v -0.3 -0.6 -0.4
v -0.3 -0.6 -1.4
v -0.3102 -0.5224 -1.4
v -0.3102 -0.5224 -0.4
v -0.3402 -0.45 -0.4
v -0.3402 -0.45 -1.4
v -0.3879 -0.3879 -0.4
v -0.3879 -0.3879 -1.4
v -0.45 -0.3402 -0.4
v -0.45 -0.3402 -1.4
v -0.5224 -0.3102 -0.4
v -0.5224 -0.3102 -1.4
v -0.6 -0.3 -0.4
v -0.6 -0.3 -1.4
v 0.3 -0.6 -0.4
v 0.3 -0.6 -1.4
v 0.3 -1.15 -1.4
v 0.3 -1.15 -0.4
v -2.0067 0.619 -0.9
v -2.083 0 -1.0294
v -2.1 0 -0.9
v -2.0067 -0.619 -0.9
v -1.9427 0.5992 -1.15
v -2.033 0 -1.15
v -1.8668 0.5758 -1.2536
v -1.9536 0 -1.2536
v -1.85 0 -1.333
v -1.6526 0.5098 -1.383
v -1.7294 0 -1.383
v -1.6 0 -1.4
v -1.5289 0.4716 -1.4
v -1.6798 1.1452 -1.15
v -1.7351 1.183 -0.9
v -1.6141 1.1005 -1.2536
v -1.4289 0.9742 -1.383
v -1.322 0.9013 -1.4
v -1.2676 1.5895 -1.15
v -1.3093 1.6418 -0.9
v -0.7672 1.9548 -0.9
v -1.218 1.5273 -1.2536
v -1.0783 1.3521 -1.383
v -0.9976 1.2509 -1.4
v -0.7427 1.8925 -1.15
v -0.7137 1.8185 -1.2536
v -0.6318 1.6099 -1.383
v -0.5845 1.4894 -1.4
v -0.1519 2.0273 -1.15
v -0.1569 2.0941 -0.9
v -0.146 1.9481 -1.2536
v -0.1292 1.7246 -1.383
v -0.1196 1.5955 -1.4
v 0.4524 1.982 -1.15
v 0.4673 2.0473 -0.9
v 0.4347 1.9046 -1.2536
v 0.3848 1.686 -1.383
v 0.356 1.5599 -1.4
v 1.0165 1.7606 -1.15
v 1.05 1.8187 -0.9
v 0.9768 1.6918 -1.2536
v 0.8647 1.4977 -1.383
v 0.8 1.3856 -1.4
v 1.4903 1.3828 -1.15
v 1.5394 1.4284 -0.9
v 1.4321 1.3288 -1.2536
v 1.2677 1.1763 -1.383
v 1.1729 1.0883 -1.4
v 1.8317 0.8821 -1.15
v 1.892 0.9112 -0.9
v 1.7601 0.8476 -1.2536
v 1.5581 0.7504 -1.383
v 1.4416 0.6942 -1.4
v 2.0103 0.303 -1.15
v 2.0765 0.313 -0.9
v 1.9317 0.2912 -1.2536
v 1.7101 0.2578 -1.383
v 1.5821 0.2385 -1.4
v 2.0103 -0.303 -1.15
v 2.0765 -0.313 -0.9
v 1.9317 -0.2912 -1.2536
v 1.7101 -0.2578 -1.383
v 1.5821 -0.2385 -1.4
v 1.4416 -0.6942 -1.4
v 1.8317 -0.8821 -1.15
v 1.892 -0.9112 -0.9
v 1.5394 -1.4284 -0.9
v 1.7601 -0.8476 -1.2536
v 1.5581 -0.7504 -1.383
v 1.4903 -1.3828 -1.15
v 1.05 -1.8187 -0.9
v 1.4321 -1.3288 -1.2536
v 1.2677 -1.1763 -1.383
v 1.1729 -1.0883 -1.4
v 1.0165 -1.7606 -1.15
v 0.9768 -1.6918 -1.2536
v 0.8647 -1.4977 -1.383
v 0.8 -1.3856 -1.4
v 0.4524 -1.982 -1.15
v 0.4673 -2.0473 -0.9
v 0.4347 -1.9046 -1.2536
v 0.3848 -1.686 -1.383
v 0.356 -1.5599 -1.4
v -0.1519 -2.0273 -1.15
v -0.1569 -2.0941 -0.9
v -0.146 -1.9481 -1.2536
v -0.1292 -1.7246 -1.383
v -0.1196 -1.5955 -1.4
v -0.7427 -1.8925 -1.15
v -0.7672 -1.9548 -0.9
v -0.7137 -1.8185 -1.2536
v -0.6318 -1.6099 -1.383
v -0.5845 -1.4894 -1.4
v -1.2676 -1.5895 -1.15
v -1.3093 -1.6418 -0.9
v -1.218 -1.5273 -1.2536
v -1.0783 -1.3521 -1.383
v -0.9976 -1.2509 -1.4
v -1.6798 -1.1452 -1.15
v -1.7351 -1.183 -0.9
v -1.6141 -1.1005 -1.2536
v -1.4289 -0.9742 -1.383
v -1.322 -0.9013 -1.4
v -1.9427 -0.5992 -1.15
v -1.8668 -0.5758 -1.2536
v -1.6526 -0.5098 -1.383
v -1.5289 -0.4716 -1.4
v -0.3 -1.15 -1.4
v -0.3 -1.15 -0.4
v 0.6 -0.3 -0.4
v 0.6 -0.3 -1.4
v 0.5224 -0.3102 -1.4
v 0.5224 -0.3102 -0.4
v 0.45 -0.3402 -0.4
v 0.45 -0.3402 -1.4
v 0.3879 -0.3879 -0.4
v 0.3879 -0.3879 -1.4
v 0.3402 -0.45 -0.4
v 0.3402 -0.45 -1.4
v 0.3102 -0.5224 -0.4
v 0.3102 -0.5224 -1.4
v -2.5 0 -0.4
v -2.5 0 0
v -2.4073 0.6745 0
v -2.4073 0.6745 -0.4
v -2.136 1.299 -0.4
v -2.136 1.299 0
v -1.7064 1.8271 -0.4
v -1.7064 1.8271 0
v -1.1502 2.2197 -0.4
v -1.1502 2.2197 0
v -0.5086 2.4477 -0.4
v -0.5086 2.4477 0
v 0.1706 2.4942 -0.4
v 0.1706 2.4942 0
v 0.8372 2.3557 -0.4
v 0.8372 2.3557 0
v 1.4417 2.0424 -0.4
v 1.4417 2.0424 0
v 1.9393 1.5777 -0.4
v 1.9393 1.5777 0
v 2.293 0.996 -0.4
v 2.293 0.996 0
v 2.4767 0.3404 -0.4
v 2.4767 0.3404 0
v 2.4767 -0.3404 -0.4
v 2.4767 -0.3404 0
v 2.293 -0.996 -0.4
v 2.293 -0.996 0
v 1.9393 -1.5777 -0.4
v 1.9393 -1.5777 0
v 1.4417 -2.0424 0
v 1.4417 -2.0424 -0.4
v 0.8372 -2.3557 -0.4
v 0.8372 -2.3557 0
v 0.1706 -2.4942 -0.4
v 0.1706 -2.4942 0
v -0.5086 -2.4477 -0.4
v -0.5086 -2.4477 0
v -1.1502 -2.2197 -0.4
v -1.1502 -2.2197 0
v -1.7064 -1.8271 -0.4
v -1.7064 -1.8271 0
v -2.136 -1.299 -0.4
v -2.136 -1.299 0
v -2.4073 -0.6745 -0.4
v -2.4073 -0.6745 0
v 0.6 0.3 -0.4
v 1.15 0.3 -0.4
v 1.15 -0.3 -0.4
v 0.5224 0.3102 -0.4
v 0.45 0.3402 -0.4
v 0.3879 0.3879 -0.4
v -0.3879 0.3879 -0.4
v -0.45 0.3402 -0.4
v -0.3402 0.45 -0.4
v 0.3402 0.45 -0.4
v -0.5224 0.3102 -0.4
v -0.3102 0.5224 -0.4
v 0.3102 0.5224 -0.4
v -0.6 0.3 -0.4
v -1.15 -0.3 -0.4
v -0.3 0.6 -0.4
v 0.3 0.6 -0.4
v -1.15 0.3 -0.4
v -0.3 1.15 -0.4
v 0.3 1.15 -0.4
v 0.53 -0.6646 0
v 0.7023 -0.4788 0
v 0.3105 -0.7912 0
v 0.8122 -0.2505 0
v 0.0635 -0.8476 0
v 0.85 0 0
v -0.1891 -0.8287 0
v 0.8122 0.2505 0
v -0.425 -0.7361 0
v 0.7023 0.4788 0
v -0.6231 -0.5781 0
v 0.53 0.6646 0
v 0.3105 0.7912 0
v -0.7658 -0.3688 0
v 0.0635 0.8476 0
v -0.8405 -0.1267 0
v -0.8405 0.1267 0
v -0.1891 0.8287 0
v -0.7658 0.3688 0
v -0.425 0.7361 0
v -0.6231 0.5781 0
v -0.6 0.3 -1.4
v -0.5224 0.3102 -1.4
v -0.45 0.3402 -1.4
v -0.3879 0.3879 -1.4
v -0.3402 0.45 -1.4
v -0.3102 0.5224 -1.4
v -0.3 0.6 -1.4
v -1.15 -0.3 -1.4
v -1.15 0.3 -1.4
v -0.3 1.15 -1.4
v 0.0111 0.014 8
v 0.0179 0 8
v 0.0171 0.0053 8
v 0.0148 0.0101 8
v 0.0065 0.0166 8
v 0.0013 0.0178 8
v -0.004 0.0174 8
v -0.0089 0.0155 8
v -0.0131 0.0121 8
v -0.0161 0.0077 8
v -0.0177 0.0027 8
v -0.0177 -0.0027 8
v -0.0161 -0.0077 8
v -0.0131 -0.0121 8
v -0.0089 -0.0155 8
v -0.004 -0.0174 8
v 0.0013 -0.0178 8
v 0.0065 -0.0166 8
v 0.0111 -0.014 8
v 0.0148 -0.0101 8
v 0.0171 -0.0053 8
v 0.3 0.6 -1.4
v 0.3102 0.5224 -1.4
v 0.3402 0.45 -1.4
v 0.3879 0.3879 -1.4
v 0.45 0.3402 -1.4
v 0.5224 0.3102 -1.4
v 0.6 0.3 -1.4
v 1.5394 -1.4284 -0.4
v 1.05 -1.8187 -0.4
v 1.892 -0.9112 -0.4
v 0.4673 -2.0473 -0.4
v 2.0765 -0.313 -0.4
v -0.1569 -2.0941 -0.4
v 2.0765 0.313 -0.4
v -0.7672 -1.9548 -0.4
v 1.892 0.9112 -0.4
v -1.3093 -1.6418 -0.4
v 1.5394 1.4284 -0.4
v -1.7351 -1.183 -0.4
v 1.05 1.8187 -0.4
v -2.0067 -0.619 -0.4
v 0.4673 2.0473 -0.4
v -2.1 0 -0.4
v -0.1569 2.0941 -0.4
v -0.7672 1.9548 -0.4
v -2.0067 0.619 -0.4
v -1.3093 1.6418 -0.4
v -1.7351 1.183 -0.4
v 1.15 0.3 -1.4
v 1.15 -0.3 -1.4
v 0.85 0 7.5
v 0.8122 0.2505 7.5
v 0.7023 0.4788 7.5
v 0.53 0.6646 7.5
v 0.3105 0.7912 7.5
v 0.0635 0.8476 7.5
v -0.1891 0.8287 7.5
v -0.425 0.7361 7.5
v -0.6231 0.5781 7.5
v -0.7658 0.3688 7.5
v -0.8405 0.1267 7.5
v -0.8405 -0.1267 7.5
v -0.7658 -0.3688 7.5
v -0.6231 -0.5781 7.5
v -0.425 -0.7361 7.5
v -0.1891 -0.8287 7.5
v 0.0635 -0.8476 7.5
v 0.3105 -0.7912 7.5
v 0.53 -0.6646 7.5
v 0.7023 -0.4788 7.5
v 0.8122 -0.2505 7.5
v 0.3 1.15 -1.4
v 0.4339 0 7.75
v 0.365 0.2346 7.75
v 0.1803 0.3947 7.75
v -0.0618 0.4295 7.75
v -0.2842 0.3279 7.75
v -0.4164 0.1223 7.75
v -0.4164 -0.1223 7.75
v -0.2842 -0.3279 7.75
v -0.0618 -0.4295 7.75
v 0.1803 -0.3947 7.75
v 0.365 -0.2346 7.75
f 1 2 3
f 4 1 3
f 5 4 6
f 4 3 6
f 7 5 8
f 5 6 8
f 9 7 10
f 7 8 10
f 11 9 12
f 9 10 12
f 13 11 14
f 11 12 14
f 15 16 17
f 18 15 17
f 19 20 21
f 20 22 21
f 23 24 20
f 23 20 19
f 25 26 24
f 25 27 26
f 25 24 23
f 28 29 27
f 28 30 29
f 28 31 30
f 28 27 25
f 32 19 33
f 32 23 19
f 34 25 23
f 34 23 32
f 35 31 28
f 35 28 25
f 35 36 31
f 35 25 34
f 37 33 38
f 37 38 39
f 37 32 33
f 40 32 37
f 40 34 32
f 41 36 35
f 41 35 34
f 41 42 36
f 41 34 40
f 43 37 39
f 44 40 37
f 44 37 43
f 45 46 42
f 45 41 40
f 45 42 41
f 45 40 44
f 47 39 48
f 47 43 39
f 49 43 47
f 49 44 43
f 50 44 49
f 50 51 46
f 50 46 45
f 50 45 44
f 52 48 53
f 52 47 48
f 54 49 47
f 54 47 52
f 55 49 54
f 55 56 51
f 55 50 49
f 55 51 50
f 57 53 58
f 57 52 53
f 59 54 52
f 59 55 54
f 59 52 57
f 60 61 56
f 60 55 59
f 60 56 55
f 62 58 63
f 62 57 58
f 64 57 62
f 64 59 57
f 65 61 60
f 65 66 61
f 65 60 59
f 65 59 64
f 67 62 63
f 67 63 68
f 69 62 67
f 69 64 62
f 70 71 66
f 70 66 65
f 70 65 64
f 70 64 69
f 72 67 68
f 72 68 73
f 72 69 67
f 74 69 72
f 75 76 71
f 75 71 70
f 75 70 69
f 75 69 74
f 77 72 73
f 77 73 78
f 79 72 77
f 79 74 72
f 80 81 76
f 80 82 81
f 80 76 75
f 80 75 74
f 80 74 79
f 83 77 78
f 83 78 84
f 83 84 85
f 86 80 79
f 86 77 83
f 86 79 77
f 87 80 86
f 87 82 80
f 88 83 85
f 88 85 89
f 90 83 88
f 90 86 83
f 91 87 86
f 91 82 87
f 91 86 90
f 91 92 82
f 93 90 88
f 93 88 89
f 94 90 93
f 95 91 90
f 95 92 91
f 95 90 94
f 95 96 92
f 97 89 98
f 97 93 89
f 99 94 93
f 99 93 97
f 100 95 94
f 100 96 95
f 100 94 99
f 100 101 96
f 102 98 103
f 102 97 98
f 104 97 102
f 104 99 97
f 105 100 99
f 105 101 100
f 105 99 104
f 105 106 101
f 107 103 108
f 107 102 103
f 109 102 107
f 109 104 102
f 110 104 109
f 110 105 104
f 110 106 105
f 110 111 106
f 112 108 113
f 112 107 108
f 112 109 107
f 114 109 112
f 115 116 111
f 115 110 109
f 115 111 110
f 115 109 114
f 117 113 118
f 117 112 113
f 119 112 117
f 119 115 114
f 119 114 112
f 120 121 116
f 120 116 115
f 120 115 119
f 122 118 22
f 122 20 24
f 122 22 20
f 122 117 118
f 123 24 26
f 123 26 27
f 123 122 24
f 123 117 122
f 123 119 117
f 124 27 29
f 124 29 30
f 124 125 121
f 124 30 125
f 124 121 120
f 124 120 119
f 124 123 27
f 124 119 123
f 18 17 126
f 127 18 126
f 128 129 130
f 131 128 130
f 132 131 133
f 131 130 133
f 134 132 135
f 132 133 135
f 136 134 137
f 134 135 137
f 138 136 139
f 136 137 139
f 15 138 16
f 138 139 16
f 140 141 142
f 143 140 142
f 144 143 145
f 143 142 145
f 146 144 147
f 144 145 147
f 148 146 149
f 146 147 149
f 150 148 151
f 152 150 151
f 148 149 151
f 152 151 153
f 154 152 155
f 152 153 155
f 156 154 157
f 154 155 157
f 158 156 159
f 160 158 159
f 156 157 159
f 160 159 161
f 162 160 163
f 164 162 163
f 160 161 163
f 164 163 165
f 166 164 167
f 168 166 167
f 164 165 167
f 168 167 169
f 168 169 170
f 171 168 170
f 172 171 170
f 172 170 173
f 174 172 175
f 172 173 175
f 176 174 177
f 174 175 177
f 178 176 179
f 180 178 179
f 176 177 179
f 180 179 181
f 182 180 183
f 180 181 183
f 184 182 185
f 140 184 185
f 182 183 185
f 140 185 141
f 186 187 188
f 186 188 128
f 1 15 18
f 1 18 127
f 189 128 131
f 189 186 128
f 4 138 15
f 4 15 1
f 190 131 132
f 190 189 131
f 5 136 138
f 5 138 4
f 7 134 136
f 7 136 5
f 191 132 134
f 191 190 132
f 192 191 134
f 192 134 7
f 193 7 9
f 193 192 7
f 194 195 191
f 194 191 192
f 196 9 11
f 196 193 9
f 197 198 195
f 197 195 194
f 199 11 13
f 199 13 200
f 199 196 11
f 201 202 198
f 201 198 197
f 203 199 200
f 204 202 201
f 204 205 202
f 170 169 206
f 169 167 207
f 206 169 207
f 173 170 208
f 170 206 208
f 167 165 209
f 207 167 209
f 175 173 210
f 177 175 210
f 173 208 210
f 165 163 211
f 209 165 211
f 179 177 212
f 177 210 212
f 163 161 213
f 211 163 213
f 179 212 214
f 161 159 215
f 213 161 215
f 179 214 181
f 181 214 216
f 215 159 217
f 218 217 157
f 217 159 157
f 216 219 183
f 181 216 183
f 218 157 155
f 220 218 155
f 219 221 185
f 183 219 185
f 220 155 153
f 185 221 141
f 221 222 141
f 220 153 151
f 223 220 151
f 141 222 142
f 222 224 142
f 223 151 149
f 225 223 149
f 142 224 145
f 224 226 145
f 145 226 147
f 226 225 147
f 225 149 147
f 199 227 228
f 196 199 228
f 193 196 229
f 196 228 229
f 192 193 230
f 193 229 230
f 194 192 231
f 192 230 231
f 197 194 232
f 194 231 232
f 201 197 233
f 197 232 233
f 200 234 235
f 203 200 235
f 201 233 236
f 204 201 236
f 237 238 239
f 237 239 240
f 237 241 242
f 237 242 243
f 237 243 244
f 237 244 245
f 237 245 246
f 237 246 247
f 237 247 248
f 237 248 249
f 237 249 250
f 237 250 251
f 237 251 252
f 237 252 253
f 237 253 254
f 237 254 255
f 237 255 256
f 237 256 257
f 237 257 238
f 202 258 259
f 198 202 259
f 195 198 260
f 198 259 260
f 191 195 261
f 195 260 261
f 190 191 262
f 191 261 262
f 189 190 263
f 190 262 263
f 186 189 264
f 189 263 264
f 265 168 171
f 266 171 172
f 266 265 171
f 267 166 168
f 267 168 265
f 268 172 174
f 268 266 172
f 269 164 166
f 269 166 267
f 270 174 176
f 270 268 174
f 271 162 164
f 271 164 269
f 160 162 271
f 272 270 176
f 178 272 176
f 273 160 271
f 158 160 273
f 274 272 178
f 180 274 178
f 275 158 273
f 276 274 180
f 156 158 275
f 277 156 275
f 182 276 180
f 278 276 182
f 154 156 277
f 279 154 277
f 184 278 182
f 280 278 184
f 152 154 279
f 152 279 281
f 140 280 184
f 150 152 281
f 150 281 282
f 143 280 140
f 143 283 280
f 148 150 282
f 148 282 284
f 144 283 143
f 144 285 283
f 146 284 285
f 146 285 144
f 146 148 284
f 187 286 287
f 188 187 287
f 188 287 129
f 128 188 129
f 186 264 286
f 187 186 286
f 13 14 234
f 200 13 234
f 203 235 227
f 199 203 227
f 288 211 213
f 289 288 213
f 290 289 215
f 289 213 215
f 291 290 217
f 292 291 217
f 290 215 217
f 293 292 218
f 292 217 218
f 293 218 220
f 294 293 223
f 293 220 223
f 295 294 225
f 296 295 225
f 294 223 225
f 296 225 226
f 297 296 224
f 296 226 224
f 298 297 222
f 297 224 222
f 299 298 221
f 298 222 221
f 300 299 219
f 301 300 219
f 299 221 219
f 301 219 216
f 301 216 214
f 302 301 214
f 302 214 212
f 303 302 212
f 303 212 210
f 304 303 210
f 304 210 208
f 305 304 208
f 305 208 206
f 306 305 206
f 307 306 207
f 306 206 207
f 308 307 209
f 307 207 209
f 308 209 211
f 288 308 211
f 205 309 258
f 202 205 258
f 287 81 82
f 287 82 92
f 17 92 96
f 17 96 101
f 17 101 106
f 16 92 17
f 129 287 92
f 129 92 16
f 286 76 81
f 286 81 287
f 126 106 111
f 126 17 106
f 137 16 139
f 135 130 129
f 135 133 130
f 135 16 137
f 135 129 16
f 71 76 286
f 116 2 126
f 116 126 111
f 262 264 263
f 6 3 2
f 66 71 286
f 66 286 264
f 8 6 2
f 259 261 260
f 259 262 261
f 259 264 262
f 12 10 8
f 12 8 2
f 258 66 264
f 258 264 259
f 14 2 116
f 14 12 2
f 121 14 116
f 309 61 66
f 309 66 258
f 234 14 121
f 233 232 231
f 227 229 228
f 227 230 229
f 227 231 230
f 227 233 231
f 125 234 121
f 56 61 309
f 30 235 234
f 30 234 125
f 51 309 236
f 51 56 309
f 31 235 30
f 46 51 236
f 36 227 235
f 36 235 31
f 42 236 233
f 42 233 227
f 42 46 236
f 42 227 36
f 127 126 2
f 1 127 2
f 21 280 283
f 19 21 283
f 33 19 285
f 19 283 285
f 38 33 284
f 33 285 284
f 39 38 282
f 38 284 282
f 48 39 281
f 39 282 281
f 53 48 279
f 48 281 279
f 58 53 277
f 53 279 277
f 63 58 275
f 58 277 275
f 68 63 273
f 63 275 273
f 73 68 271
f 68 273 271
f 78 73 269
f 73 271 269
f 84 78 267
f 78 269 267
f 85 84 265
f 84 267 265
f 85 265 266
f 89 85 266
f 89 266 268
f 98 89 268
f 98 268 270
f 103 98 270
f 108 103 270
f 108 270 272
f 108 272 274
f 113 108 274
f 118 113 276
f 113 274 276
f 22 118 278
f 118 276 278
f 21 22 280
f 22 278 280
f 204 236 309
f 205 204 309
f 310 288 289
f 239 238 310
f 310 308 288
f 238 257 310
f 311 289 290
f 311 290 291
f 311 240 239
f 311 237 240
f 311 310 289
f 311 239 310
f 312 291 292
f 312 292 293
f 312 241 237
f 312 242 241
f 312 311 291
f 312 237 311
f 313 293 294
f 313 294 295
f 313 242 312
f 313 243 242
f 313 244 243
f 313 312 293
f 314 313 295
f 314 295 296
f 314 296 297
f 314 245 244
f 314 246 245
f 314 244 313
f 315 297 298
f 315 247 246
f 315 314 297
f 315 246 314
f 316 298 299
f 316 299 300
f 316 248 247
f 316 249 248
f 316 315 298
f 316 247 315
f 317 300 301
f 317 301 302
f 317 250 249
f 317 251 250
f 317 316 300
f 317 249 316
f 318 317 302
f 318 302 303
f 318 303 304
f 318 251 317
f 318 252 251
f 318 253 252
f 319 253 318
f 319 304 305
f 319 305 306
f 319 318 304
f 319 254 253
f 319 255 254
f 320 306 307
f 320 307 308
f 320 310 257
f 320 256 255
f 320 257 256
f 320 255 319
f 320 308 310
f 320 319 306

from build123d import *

# Parameters (mm, degrees)
ESBO_O1_R                = 0.85
RESSALTO_EXTRUS_O1_DEPTH = 8
CHANFRO1_SIZE            = 0.5
CHANFRO1_SIZE2           = 0.832139741
ESBO_O2_R                = 2.5
RESSALTO_EXTRUS_O2_DEPTH = 0.4
ESBO_O3_R                = 2.1
RESSALTO_EXTRUS_O3_DEPTH = 1
FILETE1_R                = 0.5
CORTE_EXTRUS_O1_DEPTH    = 1


with BuildPart() as part:
    # Esboço1 → Ressalto-extrusão1 (new body)
    with BuildSketch(Plane.XY):
        Circle(ESBO_O1_R)
    extrude(amount=RESSALTO_EXTRUS_O1_DEPTH)

    # Chanfro1
    chanfro1_edges = [part.edges().sort_by_distance(p)[0] for p in [
        (-0.85, 0, 8),
    ]]
    chanfro1_side = [part.faces().sort_by_distance(p)[0] for p in [
        (-0.85, 0, 4),
    ]]
    chamfer(chanfro1_edges, length=CHANFRO1_SIZE, length2=CHANFRO1_SIZE2, reference=chanfro1_side[0])

    # Esboço2 → Ressalto-extrusão2 (add)
    with BuildSketch(Plane(origin=(0, 0, 0), x_dir=(-1, 0, 0), z_dir=(0, 0, -1))):
        Circle(ESBO_O2_R)
    extrude(amount=RESSALTO_EXTRUS_O2_DEPTH)

    # Esboço3 → Ressalto-extrusão3 (add)
    with BuildSketch(Plane(origin=(0, 0, -0.4), x_dir=(-1, 0, 0), z_dir=(0, 0, -1))):
        Circle(ESBO_O3_R)
    extrude(amount=RESSALTO_EXTRUS_O3_DEPTH)

    # Filete1
    filete1_edges = [part.edges().sort_by_distance(p)[0] for p in [
        (2.1, 0, -1.4),
    ]]
    fillet(filete1_edges, radius=FILETE1_R)

    # Esboço4 → Corte-extrusão1 (cut)
    with BuildSketch(Plane(origin=(0, 0, -1.4), x_dir=(-1, 0, 0), z_dir=(0, 0, -1))):
        with BuildLine():
            Line((-0.6, 0.3), (-1.15, 0.3))
            Line((-1.15, 0.3), (-1.15, -0.3))
            Line((-1.15, -0.3), (-0.6, -0.3))
            ThreePointArc((-0.6, -0.3), (-0.387867966, -0.387867966), (-0.3, -0.6))
            Line((-0.3, -0.6), (-0.3, -1.15))
            Line((-0.3, -1.15), (0.3, -1.15))
            Line((0.3, -1.15), (0.3, -0.6))
            ThreePointArc((0.3, -0.6), (0.387867966, -0.387867966), (0.6, -0.3))
            Line((0.6, -0.3), (1.15, -0.3))
            Line((1.15, -0.3), (1.15, 0.3))
            Line((1.15, 0.3), (0.6, 0.3))
            ThreePointArc((0.6, 0.3), (0.387867966, 0.387867966), (0.3, 0.6))
            Line((0.3, 0.6), (0.3, 1.15))
            Line((0.3, 1.15), (-0.3, 1.15))
            Line((-0.3, 1.15), (-0.3, 0.6))
            ThreePointArc((-0.3, 0.6), (-0.387867966, 0.387867966), (-0.6, 0.3))
        make_face()
    extrude(amount=-CORTE_EXTRUS_O1_DEPTH, mode=Mode.SUBTRACT)


solid = part.part
